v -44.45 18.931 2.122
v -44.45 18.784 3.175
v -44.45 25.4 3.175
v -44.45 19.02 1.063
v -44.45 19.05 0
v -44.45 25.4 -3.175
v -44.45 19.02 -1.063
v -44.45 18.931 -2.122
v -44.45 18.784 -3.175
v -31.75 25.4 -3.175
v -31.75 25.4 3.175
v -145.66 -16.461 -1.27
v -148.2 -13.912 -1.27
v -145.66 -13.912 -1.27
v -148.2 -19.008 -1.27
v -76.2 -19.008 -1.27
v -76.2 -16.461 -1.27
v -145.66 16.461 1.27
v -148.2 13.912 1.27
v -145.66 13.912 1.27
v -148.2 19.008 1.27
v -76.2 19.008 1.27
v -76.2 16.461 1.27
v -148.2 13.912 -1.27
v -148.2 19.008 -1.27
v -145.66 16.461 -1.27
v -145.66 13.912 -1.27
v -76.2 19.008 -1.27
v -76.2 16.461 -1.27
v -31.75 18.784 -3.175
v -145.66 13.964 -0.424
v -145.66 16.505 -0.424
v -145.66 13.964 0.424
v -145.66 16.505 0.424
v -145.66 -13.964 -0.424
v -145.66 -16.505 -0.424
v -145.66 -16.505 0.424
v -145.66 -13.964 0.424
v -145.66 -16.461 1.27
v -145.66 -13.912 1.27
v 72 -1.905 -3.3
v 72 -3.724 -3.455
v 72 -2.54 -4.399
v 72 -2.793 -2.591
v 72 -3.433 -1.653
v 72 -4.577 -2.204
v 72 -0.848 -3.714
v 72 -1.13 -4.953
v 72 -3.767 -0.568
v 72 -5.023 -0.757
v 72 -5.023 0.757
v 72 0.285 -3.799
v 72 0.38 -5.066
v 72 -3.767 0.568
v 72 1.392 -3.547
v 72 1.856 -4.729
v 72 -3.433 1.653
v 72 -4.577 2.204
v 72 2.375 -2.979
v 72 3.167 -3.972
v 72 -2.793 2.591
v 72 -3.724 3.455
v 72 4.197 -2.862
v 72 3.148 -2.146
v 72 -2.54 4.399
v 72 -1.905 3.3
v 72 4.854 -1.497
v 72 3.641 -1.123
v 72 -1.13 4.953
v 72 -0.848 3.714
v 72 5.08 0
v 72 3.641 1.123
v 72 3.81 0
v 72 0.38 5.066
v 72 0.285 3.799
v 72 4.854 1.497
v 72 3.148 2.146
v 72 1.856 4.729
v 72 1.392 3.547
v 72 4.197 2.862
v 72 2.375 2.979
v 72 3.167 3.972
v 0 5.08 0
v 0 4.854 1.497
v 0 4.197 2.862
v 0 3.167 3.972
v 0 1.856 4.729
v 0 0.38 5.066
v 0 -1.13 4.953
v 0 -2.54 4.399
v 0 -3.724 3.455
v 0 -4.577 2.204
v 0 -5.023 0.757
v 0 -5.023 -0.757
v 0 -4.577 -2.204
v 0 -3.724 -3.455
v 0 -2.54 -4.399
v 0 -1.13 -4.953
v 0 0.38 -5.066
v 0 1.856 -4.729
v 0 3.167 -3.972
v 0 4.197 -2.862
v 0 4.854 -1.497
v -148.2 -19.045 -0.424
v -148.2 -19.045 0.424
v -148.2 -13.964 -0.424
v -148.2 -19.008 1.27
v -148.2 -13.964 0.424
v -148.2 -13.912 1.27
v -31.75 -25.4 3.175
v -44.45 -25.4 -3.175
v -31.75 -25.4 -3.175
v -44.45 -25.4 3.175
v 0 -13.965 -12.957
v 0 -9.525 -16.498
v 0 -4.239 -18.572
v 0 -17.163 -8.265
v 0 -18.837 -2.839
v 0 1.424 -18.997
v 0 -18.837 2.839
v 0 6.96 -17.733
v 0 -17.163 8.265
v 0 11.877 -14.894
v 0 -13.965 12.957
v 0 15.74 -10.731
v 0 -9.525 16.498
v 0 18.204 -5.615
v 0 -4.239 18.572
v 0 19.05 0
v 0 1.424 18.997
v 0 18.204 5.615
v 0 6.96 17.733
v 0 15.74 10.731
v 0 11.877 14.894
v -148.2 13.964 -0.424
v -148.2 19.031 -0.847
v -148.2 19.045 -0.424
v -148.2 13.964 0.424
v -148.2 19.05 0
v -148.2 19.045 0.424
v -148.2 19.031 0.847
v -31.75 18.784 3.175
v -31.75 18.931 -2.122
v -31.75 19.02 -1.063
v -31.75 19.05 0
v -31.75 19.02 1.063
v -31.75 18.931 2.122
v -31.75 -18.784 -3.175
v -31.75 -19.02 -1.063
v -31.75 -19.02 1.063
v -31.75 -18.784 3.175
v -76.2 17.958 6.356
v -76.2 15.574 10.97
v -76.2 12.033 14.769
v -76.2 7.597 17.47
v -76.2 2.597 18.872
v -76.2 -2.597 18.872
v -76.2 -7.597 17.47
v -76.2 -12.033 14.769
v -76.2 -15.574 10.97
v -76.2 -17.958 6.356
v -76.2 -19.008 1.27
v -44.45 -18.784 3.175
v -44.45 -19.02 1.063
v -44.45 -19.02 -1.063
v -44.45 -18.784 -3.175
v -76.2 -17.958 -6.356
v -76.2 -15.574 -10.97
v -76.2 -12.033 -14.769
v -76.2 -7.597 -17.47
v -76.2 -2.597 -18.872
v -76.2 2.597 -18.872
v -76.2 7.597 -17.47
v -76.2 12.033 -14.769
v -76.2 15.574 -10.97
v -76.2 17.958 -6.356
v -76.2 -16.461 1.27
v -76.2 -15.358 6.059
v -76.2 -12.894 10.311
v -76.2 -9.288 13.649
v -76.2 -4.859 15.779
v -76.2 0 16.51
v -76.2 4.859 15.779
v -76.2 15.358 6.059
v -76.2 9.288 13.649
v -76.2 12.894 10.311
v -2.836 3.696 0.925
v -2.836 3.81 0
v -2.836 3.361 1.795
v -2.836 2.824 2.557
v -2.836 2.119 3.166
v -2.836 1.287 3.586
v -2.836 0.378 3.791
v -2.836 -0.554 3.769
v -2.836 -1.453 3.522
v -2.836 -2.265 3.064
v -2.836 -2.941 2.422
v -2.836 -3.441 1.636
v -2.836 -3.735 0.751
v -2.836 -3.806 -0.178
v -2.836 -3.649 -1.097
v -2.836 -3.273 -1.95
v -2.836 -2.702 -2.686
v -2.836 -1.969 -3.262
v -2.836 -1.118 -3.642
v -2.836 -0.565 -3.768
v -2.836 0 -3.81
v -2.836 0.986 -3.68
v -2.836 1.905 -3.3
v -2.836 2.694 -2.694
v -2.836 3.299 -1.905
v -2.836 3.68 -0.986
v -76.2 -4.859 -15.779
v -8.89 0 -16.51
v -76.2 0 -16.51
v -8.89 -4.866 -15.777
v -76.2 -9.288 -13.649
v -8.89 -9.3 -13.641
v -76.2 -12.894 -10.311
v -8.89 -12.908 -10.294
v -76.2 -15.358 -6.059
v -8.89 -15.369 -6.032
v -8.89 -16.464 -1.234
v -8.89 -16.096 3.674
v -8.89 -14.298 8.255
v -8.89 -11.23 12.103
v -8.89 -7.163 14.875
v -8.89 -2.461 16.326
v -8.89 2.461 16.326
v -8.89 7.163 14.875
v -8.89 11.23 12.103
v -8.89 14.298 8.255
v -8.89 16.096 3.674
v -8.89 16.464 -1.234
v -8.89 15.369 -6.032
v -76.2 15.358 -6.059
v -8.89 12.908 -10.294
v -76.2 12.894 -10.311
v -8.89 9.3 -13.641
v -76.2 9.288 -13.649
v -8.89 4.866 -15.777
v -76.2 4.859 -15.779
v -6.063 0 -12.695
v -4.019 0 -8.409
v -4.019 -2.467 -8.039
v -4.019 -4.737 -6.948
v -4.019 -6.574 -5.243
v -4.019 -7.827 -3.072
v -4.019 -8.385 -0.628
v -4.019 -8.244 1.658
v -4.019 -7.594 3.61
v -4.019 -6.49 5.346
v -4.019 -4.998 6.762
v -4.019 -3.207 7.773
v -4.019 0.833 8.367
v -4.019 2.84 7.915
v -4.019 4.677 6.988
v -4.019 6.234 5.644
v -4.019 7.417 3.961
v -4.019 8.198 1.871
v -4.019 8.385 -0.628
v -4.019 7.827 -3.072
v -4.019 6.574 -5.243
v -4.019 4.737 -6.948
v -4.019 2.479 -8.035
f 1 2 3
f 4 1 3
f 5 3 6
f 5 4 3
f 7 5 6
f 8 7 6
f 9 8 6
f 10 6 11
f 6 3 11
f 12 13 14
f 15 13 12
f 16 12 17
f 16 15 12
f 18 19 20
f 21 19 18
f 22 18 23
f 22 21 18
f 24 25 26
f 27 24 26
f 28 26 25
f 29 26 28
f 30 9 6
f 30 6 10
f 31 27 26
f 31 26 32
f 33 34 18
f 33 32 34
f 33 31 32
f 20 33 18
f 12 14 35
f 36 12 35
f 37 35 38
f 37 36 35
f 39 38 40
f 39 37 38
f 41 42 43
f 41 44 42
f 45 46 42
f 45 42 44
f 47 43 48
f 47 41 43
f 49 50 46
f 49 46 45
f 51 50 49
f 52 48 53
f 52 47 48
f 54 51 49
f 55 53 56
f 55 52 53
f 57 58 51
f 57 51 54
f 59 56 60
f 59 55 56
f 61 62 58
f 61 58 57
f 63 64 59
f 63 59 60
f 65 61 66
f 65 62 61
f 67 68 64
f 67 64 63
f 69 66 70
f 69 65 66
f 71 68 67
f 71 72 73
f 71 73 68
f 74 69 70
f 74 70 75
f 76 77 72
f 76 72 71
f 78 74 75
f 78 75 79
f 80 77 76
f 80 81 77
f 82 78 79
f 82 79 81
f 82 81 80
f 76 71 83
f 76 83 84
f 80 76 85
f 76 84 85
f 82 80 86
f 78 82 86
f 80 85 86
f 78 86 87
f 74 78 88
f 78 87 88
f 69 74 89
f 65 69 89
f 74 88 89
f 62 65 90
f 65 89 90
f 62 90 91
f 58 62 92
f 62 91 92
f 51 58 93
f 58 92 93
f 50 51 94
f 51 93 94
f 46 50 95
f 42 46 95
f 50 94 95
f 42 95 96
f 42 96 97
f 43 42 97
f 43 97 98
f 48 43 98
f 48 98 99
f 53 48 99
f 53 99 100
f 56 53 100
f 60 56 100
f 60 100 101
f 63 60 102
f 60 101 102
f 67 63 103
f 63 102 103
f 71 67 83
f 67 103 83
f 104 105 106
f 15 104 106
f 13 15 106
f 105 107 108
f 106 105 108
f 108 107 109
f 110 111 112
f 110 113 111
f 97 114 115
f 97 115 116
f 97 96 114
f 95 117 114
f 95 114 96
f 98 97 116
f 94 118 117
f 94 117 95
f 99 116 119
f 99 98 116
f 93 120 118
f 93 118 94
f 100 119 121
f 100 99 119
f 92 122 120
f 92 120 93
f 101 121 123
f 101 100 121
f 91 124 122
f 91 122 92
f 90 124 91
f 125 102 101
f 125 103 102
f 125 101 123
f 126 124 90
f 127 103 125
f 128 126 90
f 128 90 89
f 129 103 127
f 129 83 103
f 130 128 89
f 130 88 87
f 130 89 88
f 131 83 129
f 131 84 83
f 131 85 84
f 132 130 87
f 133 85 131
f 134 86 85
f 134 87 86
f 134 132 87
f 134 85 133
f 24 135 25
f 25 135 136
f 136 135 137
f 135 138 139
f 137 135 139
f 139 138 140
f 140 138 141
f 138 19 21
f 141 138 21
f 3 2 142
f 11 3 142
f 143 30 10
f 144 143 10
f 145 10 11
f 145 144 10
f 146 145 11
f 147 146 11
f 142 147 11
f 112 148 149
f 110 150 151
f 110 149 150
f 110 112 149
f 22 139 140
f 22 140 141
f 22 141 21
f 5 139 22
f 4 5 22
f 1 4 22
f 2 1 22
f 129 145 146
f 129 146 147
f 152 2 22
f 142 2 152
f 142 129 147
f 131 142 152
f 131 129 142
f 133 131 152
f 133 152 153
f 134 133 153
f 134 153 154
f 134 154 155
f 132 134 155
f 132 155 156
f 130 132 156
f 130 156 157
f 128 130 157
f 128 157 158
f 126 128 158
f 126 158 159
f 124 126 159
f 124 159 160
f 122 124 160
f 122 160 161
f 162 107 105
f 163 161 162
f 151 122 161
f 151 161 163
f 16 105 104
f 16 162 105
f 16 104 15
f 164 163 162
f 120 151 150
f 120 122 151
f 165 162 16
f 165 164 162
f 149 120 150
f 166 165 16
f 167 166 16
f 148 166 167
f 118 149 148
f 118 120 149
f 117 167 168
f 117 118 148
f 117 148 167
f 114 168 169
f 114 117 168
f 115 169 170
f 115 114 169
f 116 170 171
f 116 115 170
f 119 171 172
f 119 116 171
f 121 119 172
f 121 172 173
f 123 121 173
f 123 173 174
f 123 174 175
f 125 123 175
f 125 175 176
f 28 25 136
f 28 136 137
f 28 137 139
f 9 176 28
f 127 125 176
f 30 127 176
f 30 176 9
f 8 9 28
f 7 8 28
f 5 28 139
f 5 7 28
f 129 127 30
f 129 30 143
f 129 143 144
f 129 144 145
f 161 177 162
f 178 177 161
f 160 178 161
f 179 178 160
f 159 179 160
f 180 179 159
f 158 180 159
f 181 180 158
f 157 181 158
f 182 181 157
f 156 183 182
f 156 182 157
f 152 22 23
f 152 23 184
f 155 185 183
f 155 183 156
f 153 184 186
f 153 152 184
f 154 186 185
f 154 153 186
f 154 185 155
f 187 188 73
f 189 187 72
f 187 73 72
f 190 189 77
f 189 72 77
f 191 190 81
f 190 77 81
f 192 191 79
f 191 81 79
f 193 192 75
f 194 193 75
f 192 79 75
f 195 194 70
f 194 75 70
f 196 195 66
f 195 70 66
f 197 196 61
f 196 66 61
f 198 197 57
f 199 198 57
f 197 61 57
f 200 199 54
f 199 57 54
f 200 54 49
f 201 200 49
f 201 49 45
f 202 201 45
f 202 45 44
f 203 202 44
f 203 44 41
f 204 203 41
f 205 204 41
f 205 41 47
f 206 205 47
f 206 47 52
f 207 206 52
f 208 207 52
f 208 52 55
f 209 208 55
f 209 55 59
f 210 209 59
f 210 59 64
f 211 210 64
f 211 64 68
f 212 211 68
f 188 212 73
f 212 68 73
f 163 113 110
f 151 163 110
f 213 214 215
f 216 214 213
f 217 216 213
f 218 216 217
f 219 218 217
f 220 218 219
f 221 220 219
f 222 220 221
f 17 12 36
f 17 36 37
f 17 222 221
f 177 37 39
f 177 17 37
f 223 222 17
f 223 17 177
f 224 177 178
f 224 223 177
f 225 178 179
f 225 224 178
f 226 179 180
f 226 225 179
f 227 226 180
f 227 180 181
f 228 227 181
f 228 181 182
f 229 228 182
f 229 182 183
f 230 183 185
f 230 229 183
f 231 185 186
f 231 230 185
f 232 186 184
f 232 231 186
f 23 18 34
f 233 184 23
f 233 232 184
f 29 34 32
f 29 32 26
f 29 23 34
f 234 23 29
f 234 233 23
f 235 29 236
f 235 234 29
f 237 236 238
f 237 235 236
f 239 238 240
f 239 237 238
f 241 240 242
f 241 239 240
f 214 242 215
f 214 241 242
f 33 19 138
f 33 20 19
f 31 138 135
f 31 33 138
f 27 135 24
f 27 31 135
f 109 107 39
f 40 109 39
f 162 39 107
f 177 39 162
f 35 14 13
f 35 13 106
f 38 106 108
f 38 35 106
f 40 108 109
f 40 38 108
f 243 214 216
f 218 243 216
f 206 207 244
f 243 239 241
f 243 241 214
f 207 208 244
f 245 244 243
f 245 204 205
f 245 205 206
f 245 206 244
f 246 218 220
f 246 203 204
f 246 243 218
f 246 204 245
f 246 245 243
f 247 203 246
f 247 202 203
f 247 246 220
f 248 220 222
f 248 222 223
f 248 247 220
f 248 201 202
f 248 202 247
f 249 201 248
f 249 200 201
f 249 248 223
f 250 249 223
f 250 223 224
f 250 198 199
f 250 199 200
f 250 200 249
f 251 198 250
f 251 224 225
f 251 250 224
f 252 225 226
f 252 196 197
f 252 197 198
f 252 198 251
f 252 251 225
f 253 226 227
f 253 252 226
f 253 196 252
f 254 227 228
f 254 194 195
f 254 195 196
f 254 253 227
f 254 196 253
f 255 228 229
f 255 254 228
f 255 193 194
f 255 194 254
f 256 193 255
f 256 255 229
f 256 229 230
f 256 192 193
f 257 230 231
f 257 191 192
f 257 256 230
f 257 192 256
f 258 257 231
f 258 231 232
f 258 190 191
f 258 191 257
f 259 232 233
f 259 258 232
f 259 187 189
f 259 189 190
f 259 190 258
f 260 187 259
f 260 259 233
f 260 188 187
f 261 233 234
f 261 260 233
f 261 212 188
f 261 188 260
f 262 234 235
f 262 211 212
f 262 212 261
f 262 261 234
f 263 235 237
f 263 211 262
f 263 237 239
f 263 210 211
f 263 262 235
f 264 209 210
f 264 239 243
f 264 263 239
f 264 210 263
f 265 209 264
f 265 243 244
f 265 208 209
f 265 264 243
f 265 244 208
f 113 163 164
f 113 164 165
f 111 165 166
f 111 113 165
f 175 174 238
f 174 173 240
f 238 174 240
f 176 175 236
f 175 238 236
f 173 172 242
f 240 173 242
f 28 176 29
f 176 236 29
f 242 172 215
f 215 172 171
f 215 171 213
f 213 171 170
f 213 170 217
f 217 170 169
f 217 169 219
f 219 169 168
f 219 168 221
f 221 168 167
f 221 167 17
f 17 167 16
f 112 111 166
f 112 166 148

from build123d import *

# Parameters (mm, degrees)
F0_R      = 19.05
F1_DEPTH  = 148.2
F3_W      = 12.7
F3_H      = 3.175
F4_DEPTH  = 25.4
F6_W      = 101.6
F6_H      = 31.79568
F7_DEPTH  = 25.4
F8_R      = 5.08
F9_DEPTH  = 72
F10_R     = 3.81
F11_DEPTH = 152.4


with BuildPart() as f1:
    # F0 (on Right) → F1 (new body)
    with BuildSketch(Plane.YZ):
        Circle(F0_R)
    extrude(amount=-F1_DEPTH)

    # F3 (on Front) → F4 (join, symmetric)
    with BuildSketch(Plane.XZ):
        with Locations((-38.1, -1.5875)):
            Rectangle(F3_W, F3_H)
        with Locations((-38.1, 1.5875)):
            Rectangle(F3_W, F3_H)
    extrude(amount=F4_DEPTH, both=True)

    # F2 (on Front) → F5 (revolve, cut)
    with BuildSketch(Plane.XZ):
        with BuildLine():
            ThreePointArc((-8.89, -16.51), (-4.182231, -8.844527), (-2.54, 0))
            Line((-2.54, 0), (-8.89, 0))
            Line((-8.89, 0), (-8.89, -16.51))
        make_face()
        Polygon((-8.89, -16.51), (-8.89, 0), (-148.2, 0), (-148.2, -13.97), (-145.66, -13.97), (-145.66, -16.51), (-76.2, -16.51), align=None)
    revolve(axis=Axis((-78.545, 0, 0), (-1, 0, 0)), mode=Mode.SUBTRACT)

    # F6 (on Front) → F7 (cut, symmetric)
    with BuildSketch(Plane.XZ):
        Polygon((-177.8, 1.27), (-76.2, 1.27), (-76.2, 26.052563), (-178.992286, 26.052563), align=None)
        with Locations((-127, -17.16784)):
            Rectangle(F6_W, F6_H)
    extrude(amount=F7_DEPTH, both=True, mode=Mode.SUBTRACT)

    # F8 (on face) → F9 (join)
    with BuildSketch(Plane.YZ):
        Circle(F8_R)
    extrude(amount=F9_DEPTH)

    # F10 (on face) → F11 (cut)
    with BuildSketch(Plane.YZ.offset(72)):
        Circle(F10_R)
    extrude(amount=-F11_DEPTH, mode=Mode.SUBTRACT)


solid = f1.part
